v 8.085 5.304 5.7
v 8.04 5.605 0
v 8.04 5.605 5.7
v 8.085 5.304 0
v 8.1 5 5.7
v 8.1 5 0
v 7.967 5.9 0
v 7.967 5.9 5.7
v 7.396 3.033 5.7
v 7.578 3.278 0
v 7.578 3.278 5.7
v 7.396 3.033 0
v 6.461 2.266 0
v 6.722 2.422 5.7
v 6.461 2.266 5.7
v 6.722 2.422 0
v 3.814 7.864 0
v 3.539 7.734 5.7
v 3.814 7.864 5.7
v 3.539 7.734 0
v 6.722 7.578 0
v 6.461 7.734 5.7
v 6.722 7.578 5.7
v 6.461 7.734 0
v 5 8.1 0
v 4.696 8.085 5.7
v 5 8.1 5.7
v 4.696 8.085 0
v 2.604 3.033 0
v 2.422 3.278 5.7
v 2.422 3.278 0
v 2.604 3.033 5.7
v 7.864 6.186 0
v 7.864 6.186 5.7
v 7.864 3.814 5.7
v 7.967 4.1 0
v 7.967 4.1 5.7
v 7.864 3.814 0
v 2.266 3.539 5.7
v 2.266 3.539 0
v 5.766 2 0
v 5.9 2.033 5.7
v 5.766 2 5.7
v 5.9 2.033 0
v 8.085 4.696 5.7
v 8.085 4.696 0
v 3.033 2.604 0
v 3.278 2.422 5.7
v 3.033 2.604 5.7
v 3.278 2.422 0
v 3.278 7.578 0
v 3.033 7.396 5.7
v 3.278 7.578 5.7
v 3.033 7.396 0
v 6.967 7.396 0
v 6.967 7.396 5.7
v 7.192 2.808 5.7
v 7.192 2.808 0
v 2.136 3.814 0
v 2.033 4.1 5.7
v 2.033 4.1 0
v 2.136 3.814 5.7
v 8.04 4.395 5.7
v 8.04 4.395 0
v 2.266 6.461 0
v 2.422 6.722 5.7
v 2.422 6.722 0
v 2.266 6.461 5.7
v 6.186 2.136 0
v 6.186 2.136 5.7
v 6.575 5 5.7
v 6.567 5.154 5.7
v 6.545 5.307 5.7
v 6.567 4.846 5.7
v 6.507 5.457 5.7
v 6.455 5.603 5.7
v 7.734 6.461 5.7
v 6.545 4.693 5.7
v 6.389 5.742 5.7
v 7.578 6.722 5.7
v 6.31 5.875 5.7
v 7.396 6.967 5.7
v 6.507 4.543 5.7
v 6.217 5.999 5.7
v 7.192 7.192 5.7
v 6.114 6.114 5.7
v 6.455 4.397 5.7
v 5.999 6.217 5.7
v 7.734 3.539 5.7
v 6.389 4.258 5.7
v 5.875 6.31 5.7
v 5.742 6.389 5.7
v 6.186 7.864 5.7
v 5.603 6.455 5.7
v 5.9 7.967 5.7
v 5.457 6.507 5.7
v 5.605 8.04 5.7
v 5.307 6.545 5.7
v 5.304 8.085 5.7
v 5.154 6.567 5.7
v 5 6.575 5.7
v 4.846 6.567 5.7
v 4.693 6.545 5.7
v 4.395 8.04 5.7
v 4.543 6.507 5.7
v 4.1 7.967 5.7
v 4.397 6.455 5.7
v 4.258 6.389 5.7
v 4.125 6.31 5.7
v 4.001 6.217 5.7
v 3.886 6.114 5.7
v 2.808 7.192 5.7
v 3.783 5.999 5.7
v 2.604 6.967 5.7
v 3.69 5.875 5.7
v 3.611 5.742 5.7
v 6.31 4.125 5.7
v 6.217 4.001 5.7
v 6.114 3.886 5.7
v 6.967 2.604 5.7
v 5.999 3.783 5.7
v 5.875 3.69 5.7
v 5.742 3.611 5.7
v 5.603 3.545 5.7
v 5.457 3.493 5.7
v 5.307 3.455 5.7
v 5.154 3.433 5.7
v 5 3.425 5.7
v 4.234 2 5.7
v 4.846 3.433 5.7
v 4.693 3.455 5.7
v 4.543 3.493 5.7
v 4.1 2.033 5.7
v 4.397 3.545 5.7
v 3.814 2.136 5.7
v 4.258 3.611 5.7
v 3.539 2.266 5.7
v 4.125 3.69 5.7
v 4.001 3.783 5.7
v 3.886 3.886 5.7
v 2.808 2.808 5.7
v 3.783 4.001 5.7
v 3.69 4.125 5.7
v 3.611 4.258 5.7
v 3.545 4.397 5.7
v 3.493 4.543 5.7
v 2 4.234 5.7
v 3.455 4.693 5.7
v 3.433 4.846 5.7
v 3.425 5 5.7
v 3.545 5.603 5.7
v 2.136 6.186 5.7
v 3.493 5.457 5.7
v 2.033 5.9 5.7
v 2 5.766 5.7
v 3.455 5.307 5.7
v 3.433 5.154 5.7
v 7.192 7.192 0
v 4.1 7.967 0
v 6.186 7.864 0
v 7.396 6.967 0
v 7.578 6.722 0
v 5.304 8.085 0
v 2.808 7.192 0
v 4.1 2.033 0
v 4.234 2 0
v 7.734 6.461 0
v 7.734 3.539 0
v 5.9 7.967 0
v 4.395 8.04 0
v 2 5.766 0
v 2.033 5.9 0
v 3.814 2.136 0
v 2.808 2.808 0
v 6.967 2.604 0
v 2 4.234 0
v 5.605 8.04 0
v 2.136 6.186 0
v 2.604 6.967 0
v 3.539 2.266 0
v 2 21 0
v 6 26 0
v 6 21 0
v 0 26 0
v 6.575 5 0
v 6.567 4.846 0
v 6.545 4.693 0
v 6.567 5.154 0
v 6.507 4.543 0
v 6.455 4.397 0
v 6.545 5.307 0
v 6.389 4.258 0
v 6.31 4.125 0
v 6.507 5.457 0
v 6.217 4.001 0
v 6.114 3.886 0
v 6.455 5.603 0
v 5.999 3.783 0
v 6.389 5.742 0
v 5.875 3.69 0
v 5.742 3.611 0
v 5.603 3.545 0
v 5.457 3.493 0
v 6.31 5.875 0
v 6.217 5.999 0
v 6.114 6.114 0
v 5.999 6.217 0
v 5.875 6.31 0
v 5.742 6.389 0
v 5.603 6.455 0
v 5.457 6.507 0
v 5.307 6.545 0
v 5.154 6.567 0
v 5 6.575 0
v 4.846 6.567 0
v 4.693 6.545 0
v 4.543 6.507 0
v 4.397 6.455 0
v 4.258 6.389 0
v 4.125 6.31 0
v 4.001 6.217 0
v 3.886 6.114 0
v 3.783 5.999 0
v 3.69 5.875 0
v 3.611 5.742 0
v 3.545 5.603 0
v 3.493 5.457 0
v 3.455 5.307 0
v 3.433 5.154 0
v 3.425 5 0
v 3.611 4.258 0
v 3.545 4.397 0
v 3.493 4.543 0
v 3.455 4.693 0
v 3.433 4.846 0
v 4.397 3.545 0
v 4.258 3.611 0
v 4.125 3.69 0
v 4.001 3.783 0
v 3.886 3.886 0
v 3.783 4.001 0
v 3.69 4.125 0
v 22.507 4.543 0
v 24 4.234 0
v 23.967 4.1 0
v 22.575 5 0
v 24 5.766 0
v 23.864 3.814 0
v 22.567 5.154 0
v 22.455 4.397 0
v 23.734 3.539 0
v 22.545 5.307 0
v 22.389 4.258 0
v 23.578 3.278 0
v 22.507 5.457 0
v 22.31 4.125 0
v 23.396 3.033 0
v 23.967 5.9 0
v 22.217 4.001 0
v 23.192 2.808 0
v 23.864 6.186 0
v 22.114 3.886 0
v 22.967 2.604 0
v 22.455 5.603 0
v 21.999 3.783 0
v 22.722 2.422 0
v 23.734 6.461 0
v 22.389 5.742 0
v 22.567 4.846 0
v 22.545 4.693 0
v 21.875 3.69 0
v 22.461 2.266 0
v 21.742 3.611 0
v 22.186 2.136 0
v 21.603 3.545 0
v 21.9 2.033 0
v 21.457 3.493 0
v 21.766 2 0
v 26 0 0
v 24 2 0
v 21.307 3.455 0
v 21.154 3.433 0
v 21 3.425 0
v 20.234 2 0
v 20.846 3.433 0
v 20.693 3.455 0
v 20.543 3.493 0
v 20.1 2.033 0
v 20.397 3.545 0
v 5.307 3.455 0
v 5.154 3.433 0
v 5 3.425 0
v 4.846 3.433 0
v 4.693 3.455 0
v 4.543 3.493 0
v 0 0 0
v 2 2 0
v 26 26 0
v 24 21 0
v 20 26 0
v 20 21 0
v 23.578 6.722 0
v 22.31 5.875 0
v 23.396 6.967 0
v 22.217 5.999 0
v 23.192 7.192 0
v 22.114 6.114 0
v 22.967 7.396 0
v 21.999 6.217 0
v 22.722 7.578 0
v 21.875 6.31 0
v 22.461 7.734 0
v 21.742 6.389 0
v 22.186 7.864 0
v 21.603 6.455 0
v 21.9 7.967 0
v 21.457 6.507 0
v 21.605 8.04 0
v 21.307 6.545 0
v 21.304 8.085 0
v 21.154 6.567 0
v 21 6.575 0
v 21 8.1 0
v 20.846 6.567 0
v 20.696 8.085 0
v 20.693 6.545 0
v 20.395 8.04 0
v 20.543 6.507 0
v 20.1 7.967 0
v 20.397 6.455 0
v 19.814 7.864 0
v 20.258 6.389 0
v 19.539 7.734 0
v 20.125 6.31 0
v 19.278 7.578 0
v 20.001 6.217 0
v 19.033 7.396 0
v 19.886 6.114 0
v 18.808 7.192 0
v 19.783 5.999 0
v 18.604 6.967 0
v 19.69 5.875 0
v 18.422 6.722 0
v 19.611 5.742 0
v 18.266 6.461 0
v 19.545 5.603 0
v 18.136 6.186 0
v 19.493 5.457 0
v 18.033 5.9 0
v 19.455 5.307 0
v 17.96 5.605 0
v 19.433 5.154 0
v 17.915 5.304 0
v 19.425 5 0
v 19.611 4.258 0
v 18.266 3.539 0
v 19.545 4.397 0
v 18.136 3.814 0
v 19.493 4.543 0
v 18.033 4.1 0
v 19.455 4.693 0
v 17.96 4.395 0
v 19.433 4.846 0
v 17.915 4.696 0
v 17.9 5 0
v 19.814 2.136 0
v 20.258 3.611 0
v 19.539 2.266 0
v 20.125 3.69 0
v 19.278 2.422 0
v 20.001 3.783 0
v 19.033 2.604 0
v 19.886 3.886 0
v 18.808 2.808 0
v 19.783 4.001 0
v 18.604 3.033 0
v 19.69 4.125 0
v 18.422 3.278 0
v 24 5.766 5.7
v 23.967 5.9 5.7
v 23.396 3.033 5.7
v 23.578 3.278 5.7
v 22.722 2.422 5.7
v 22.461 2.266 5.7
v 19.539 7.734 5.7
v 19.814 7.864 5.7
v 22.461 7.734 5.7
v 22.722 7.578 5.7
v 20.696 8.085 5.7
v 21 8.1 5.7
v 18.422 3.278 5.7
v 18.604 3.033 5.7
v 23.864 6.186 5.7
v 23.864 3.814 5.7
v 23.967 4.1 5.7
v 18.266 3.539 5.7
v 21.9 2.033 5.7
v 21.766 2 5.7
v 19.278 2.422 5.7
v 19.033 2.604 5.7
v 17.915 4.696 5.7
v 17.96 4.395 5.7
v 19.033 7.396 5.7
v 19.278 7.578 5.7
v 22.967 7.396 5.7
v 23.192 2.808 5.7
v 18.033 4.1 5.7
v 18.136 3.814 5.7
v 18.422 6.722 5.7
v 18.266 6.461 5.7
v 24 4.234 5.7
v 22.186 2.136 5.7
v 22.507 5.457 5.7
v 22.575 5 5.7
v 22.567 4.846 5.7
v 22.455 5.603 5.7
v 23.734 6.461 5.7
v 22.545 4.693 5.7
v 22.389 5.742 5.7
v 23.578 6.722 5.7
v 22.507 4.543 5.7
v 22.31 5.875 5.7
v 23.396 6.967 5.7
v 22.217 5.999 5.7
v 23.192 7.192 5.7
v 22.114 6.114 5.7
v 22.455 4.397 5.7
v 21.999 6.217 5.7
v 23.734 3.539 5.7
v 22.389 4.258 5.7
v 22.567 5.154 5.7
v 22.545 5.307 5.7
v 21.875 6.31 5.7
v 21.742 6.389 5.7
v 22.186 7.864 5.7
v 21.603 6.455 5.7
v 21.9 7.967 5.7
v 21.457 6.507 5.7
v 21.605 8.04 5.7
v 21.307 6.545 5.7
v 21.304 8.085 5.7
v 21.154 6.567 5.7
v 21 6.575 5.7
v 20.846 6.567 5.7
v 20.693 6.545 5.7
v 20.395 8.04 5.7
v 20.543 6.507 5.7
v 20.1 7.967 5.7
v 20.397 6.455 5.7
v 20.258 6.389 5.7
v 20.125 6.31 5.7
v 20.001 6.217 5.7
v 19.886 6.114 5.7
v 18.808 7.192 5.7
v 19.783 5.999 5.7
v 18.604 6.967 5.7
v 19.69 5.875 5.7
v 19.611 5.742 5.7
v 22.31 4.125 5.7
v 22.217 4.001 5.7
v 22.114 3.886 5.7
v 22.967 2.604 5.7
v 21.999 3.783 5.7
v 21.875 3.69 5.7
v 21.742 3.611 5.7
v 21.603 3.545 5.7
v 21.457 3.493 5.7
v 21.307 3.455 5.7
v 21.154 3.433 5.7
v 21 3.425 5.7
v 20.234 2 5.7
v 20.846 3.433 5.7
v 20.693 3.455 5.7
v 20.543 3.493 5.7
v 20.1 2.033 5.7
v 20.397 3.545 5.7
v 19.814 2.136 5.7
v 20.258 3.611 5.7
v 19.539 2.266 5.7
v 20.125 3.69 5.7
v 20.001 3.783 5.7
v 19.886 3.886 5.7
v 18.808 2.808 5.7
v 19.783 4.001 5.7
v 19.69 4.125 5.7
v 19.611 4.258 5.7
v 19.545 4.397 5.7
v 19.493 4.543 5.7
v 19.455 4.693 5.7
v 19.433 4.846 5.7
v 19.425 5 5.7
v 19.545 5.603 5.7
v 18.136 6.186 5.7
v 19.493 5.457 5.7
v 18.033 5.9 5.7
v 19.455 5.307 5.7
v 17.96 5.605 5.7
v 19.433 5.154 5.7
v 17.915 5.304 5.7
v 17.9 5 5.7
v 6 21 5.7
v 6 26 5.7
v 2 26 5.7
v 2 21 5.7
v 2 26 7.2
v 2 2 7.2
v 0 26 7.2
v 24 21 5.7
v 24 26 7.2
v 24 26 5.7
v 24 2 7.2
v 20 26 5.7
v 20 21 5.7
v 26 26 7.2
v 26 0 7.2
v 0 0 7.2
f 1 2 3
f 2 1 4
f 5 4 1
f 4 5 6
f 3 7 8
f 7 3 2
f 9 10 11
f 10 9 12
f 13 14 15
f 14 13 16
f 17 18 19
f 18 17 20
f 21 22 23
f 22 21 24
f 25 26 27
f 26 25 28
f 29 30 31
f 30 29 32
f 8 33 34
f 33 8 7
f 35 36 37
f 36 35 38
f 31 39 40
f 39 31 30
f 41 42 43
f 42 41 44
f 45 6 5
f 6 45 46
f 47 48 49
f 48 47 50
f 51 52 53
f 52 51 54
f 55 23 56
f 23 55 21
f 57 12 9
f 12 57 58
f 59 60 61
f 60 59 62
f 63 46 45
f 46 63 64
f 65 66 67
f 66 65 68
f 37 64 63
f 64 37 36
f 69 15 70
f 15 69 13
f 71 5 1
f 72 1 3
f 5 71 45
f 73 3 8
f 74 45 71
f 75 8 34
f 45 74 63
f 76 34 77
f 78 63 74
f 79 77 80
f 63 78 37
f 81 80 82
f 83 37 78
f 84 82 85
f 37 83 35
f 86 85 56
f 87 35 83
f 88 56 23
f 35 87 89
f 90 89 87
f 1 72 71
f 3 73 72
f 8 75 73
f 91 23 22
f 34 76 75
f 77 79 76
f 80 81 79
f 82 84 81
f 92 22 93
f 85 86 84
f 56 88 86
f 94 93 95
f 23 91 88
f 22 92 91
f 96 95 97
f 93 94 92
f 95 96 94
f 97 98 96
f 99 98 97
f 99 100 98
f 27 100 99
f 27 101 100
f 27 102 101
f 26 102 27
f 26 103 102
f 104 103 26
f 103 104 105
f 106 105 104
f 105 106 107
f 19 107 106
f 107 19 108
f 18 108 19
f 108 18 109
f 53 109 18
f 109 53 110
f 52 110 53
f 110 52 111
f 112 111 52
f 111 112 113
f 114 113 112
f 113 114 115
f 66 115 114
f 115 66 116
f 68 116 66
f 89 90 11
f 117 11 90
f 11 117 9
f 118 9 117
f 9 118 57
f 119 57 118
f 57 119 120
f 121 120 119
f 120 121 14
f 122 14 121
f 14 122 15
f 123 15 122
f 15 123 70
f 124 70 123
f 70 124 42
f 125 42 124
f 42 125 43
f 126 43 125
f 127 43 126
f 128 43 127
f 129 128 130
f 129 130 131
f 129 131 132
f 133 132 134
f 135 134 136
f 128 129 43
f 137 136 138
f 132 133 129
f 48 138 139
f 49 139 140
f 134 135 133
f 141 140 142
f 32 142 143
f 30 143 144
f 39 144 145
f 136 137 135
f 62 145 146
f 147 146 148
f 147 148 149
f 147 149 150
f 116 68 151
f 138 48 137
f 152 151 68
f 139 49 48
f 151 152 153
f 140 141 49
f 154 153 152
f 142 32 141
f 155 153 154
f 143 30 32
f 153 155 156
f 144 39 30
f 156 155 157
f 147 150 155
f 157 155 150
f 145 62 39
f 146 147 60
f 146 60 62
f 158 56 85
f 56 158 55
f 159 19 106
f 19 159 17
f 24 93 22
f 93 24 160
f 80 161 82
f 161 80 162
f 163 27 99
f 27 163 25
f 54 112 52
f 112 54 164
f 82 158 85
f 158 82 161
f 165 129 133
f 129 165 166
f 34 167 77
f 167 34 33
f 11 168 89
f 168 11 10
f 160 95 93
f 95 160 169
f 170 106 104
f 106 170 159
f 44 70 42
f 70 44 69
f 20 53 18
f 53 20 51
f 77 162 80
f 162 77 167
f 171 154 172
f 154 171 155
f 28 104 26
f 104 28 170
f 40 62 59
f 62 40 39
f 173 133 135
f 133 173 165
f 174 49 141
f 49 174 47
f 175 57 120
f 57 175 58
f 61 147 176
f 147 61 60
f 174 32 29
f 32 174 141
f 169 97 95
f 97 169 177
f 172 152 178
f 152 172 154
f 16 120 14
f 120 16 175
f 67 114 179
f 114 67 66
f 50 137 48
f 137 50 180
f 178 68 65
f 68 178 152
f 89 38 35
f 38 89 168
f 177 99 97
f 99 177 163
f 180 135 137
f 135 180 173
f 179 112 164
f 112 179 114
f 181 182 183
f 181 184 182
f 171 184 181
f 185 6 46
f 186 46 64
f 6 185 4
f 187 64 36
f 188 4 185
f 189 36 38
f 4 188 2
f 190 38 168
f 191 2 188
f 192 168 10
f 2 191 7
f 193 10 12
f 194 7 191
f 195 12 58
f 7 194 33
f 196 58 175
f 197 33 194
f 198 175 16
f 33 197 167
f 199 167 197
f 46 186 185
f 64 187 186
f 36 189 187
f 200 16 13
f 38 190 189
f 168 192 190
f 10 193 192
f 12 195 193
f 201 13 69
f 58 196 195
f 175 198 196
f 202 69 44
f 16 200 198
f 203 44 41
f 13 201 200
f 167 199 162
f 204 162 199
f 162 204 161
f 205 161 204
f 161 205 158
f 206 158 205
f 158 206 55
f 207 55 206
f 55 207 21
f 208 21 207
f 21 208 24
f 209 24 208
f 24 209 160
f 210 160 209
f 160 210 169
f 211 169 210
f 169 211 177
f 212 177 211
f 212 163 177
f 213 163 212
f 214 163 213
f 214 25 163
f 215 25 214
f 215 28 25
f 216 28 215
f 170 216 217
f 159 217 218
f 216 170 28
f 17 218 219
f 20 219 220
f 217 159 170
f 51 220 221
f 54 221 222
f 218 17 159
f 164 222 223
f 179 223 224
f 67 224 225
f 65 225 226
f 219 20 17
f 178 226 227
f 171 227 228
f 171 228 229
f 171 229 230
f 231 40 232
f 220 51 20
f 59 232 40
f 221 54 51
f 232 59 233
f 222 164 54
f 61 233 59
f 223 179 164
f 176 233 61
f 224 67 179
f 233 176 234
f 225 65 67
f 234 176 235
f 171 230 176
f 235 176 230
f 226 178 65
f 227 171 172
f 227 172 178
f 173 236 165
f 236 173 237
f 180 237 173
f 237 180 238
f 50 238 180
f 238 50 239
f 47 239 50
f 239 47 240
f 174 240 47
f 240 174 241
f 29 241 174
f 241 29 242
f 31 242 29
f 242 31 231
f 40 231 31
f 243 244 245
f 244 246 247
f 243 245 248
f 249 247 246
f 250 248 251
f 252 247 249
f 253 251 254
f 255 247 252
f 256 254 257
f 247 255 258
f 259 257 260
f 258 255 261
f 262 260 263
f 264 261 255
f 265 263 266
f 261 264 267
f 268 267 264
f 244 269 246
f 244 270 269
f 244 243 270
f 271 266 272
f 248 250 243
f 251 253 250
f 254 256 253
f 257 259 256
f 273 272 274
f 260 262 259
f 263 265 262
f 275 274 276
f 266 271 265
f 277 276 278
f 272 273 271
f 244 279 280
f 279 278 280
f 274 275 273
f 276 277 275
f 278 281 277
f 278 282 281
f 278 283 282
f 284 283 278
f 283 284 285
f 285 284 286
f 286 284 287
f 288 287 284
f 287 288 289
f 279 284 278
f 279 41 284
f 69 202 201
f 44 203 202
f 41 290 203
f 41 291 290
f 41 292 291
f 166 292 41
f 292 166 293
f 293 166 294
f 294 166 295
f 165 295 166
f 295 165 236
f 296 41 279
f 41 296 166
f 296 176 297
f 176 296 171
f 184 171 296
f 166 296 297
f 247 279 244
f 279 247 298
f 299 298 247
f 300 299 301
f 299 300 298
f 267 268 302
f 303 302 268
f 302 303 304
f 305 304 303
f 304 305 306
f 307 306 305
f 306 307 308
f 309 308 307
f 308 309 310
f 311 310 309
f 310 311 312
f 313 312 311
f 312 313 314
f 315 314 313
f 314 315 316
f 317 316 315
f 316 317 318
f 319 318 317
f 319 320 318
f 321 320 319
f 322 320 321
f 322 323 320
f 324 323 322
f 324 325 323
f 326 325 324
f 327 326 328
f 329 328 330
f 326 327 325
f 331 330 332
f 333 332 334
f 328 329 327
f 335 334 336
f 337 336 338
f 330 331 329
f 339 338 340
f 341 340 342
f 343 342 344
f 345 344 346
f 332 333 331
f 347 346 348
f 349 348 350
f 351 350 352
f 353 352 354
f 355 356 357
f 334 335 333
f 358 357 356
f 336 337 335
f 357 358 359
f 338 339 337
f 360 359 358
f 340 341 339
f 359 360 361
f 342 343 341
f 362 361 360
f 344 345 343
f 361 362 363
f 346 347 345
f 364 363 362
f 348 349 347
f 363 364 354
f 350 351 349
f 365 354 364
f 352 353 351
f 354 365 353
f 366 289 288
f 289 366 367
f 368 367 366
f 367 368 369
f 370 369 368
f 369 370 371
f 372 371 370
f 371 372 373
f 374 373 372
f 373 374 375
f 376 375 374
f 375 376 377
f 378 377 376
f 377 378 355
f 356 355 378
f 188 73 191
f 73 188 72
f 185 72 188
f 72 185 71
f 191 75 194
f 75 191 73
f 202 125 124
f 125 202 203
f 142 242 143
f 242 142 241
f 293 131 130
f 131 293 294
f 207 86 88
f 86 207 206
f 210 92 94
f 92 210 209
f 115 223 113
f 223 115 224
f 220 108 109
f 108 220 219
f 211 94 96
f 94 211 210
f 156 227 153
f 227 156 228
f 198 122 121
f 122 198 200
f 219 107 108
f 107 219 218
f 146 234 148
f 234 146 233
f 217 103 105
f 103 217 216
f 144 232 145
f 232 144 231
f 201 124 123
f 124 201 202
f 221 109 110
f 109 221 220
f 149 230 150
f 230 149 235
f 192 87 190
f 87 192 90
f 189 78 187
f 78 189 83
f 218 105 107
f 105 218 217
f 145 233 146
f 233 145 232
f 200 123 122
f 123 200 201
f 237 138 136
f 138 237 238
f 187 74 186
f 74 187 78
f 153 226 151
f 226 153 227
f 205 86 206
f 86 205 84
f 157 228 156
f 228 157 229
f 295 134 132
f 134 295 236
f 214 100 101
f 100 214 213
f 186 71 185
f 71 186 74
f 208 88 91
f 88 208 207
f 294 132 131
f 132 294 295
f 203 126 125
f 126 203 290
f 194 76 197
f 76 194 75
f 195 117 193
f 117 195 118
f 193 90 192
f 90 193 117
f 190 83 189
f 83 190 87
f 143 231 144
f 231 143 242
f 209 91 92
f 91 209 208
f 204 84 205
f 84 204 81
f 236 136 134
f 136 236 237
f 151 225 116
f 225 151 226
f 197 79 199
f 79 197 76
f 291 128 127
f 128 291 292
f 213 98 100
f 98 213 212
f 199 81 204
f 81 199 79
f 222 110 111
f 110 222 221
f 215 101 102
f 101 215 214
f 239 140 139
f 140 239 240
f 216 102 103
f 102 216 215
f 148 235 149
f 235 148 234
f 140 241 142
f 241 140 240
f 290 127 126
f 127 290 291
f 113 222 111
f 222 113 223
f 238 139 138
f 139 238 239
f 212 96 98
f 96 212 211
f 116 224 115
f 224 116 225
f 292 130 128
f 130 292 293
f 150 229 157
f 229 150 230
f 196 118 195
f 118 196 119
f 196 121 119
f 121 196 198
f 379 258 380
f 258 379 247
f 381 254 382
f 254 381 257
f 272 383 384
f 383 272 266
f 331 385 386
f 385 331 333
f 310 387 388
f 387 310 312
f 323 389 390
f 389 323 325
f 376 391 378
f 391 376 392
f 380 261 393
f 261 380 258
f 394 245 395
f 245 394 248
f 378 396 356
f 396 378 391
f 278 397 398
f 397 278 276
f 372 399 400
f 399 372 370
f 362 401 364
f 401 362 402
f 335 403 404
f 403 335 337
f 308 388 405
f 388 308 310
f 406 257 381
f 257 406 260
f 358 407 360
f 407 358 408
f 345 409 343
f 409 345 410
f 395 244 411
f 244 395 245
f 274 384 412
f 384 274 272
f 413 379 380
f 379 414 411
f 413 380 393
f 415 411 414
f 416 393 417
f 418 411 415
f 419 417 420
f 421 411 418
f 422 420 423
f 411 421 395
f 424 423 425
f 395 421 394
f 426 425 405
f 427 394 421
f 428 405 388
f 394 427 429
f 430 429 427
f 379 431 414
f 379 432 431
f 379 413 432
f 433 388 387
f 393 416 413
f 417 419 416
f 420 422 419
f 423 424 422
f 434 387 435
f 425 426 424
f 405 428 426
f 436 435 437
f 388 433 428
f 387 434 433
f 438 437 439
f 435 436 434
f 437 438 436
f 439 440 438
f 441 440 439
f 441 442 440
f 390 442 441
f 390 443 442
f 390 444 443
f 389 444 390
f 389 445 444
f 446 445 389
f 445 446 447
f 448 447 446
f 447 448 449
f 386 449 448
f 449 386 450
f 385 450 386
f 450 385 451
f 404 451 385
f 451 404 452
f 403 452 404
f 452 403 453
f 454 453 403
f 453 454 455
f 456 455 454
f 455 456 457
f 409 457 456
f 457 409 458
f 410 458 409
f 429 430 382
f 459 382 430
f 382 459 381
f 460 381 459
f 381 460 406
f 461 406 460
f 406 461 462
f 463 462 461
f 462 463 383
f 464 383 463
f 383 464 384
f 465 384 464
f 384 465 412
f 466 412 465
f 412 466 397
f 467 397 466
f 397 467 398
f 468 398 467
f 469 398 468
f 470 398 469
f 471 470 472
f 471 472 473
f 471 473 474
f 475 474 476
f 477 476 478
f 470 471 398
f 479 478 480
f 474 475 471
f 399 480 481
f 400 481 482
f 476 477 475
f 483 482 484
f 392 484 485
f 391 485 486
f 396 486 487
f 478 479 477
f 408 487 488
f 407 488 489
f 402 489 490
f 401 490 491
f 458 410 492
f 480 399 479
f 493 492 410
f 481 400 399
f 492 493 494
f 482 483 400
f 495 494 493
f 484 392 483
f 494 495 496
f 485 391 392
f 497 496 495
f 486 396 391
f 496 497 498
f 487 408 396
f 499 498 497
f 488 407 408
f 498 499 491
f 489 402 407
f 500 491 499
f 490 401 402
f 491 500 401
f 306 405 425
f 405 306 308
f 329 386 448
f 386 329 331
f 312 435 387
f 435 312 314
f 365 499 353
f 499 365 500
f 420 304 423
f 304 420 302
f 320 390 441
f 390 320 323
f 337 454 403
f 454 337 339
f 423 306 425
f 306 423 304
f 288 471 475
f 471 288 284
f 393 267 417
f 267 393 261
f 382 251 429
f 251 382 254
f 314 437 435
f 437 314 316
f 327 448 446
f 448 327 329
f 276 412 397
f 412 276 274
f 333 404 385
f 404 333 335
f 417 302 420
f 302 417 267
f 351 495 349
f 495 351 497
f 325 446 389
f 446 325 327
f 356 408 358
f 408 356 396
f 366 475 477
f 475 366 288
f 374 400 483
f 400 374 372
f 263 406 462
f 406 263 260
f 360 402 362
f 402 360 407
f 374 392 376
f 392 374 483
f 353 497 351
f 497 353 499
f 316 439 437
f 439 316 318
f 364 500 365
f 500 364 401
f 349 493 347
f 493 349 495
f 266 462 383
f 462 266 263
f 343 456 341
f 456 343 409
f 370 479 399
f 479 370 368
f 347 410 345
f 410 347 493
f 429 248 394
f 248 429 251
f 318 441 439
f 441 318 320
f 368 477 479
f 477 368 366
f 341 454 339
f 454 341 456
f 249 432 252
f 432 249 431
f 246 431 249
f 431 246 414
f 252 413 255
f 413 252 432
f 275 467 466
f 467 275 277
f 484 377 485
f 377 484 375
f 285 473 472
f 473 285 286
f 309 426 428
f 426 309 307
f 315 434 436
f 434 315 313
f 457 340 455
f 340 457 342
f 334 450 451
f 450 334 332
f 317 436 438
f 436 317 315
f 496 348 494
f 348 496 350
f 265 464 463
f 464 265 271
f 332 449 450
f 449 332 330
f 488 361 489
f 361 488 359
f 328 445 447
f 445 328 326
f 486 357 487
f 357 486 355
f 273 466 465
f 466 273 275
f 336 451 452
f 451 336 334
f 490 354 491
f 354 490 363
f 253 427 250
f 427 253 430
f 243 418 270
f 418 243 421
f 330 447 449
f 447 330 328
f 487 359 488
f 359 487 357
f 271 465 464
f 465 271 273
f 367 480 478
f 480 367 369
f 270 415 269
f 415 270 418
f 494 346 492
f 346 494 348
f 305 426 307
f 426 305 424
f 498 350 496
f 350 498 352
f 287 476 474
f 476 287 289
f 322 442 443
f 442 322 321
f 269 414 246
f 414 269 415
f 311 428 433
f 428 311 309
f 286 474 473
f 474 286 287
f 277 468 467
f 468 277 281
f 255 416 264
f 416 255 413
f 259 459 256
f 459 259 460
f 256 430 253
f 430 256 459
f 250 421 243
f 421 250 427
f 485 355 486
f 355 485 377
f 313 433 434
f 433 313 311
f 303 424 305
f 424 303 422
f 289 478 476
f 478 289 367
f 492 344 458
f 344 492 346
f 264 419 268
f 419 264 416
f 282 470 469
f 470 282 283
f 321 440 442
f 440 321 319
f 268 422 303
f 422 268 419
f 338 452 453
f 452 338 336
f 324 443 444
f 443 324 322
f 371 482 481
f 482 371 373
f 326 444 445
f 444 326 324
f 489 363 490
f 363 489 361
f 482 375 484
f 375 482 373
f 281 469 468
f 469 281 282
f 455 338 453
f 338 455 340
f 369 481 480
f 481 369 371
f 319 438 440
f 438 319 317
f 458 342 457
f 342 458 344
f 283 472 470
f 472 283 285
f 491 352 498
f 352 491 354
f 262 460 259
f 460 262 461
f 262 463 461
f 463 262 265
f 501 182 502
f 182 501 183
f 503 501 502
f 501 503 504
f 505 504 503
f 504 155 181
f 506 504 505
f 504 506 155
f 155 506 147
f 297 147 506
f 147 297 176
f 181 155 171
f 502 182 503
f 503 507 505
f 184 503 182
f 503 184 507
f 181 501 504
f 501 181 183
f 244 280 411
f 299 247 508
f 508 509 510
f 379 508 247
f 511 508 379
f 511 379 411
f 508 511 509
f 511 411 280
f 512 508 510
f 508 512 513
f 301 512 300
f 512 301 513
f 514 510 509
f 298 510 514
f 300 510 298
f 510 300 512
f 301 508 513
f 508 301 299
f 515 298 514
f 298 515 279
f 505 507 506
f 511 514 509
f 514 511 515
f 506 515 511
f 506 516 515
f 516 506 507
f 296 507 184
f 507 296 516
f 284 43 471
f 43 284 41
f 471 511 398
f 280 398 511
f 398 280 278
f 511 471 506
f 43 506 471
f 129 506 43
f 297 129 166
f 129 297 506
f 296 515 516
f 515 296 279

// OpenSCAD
$fn=64;

sHeight=7.2;

module screwMount(){
  difference(){
      cylinder(h = sHeight-1.5,
           d = 6.2,
           center = false);
      cylinder(h = sHeight-1.5,
           d = 3.15,
           center = false);  
  }  
}

module spacer(){
    cube([4,5,sHeight-1.5],false);  
}


module main(){
  union(){
   translate([5, 5, 0])
    screwMount();
   translate([21, 5, 0])
    screwMount();

   translate([2,21,0])
    spacer();
   translate([20,21,0])
    spacer();

   translate([0,0,0])
    cube([26,2,sHeight],false);

   translate([0,0,0])
    cube([2,26,sHeight],false);    
   translate([24,0])
    cube([2,26,sHeight],false);
  }  
}


main();
